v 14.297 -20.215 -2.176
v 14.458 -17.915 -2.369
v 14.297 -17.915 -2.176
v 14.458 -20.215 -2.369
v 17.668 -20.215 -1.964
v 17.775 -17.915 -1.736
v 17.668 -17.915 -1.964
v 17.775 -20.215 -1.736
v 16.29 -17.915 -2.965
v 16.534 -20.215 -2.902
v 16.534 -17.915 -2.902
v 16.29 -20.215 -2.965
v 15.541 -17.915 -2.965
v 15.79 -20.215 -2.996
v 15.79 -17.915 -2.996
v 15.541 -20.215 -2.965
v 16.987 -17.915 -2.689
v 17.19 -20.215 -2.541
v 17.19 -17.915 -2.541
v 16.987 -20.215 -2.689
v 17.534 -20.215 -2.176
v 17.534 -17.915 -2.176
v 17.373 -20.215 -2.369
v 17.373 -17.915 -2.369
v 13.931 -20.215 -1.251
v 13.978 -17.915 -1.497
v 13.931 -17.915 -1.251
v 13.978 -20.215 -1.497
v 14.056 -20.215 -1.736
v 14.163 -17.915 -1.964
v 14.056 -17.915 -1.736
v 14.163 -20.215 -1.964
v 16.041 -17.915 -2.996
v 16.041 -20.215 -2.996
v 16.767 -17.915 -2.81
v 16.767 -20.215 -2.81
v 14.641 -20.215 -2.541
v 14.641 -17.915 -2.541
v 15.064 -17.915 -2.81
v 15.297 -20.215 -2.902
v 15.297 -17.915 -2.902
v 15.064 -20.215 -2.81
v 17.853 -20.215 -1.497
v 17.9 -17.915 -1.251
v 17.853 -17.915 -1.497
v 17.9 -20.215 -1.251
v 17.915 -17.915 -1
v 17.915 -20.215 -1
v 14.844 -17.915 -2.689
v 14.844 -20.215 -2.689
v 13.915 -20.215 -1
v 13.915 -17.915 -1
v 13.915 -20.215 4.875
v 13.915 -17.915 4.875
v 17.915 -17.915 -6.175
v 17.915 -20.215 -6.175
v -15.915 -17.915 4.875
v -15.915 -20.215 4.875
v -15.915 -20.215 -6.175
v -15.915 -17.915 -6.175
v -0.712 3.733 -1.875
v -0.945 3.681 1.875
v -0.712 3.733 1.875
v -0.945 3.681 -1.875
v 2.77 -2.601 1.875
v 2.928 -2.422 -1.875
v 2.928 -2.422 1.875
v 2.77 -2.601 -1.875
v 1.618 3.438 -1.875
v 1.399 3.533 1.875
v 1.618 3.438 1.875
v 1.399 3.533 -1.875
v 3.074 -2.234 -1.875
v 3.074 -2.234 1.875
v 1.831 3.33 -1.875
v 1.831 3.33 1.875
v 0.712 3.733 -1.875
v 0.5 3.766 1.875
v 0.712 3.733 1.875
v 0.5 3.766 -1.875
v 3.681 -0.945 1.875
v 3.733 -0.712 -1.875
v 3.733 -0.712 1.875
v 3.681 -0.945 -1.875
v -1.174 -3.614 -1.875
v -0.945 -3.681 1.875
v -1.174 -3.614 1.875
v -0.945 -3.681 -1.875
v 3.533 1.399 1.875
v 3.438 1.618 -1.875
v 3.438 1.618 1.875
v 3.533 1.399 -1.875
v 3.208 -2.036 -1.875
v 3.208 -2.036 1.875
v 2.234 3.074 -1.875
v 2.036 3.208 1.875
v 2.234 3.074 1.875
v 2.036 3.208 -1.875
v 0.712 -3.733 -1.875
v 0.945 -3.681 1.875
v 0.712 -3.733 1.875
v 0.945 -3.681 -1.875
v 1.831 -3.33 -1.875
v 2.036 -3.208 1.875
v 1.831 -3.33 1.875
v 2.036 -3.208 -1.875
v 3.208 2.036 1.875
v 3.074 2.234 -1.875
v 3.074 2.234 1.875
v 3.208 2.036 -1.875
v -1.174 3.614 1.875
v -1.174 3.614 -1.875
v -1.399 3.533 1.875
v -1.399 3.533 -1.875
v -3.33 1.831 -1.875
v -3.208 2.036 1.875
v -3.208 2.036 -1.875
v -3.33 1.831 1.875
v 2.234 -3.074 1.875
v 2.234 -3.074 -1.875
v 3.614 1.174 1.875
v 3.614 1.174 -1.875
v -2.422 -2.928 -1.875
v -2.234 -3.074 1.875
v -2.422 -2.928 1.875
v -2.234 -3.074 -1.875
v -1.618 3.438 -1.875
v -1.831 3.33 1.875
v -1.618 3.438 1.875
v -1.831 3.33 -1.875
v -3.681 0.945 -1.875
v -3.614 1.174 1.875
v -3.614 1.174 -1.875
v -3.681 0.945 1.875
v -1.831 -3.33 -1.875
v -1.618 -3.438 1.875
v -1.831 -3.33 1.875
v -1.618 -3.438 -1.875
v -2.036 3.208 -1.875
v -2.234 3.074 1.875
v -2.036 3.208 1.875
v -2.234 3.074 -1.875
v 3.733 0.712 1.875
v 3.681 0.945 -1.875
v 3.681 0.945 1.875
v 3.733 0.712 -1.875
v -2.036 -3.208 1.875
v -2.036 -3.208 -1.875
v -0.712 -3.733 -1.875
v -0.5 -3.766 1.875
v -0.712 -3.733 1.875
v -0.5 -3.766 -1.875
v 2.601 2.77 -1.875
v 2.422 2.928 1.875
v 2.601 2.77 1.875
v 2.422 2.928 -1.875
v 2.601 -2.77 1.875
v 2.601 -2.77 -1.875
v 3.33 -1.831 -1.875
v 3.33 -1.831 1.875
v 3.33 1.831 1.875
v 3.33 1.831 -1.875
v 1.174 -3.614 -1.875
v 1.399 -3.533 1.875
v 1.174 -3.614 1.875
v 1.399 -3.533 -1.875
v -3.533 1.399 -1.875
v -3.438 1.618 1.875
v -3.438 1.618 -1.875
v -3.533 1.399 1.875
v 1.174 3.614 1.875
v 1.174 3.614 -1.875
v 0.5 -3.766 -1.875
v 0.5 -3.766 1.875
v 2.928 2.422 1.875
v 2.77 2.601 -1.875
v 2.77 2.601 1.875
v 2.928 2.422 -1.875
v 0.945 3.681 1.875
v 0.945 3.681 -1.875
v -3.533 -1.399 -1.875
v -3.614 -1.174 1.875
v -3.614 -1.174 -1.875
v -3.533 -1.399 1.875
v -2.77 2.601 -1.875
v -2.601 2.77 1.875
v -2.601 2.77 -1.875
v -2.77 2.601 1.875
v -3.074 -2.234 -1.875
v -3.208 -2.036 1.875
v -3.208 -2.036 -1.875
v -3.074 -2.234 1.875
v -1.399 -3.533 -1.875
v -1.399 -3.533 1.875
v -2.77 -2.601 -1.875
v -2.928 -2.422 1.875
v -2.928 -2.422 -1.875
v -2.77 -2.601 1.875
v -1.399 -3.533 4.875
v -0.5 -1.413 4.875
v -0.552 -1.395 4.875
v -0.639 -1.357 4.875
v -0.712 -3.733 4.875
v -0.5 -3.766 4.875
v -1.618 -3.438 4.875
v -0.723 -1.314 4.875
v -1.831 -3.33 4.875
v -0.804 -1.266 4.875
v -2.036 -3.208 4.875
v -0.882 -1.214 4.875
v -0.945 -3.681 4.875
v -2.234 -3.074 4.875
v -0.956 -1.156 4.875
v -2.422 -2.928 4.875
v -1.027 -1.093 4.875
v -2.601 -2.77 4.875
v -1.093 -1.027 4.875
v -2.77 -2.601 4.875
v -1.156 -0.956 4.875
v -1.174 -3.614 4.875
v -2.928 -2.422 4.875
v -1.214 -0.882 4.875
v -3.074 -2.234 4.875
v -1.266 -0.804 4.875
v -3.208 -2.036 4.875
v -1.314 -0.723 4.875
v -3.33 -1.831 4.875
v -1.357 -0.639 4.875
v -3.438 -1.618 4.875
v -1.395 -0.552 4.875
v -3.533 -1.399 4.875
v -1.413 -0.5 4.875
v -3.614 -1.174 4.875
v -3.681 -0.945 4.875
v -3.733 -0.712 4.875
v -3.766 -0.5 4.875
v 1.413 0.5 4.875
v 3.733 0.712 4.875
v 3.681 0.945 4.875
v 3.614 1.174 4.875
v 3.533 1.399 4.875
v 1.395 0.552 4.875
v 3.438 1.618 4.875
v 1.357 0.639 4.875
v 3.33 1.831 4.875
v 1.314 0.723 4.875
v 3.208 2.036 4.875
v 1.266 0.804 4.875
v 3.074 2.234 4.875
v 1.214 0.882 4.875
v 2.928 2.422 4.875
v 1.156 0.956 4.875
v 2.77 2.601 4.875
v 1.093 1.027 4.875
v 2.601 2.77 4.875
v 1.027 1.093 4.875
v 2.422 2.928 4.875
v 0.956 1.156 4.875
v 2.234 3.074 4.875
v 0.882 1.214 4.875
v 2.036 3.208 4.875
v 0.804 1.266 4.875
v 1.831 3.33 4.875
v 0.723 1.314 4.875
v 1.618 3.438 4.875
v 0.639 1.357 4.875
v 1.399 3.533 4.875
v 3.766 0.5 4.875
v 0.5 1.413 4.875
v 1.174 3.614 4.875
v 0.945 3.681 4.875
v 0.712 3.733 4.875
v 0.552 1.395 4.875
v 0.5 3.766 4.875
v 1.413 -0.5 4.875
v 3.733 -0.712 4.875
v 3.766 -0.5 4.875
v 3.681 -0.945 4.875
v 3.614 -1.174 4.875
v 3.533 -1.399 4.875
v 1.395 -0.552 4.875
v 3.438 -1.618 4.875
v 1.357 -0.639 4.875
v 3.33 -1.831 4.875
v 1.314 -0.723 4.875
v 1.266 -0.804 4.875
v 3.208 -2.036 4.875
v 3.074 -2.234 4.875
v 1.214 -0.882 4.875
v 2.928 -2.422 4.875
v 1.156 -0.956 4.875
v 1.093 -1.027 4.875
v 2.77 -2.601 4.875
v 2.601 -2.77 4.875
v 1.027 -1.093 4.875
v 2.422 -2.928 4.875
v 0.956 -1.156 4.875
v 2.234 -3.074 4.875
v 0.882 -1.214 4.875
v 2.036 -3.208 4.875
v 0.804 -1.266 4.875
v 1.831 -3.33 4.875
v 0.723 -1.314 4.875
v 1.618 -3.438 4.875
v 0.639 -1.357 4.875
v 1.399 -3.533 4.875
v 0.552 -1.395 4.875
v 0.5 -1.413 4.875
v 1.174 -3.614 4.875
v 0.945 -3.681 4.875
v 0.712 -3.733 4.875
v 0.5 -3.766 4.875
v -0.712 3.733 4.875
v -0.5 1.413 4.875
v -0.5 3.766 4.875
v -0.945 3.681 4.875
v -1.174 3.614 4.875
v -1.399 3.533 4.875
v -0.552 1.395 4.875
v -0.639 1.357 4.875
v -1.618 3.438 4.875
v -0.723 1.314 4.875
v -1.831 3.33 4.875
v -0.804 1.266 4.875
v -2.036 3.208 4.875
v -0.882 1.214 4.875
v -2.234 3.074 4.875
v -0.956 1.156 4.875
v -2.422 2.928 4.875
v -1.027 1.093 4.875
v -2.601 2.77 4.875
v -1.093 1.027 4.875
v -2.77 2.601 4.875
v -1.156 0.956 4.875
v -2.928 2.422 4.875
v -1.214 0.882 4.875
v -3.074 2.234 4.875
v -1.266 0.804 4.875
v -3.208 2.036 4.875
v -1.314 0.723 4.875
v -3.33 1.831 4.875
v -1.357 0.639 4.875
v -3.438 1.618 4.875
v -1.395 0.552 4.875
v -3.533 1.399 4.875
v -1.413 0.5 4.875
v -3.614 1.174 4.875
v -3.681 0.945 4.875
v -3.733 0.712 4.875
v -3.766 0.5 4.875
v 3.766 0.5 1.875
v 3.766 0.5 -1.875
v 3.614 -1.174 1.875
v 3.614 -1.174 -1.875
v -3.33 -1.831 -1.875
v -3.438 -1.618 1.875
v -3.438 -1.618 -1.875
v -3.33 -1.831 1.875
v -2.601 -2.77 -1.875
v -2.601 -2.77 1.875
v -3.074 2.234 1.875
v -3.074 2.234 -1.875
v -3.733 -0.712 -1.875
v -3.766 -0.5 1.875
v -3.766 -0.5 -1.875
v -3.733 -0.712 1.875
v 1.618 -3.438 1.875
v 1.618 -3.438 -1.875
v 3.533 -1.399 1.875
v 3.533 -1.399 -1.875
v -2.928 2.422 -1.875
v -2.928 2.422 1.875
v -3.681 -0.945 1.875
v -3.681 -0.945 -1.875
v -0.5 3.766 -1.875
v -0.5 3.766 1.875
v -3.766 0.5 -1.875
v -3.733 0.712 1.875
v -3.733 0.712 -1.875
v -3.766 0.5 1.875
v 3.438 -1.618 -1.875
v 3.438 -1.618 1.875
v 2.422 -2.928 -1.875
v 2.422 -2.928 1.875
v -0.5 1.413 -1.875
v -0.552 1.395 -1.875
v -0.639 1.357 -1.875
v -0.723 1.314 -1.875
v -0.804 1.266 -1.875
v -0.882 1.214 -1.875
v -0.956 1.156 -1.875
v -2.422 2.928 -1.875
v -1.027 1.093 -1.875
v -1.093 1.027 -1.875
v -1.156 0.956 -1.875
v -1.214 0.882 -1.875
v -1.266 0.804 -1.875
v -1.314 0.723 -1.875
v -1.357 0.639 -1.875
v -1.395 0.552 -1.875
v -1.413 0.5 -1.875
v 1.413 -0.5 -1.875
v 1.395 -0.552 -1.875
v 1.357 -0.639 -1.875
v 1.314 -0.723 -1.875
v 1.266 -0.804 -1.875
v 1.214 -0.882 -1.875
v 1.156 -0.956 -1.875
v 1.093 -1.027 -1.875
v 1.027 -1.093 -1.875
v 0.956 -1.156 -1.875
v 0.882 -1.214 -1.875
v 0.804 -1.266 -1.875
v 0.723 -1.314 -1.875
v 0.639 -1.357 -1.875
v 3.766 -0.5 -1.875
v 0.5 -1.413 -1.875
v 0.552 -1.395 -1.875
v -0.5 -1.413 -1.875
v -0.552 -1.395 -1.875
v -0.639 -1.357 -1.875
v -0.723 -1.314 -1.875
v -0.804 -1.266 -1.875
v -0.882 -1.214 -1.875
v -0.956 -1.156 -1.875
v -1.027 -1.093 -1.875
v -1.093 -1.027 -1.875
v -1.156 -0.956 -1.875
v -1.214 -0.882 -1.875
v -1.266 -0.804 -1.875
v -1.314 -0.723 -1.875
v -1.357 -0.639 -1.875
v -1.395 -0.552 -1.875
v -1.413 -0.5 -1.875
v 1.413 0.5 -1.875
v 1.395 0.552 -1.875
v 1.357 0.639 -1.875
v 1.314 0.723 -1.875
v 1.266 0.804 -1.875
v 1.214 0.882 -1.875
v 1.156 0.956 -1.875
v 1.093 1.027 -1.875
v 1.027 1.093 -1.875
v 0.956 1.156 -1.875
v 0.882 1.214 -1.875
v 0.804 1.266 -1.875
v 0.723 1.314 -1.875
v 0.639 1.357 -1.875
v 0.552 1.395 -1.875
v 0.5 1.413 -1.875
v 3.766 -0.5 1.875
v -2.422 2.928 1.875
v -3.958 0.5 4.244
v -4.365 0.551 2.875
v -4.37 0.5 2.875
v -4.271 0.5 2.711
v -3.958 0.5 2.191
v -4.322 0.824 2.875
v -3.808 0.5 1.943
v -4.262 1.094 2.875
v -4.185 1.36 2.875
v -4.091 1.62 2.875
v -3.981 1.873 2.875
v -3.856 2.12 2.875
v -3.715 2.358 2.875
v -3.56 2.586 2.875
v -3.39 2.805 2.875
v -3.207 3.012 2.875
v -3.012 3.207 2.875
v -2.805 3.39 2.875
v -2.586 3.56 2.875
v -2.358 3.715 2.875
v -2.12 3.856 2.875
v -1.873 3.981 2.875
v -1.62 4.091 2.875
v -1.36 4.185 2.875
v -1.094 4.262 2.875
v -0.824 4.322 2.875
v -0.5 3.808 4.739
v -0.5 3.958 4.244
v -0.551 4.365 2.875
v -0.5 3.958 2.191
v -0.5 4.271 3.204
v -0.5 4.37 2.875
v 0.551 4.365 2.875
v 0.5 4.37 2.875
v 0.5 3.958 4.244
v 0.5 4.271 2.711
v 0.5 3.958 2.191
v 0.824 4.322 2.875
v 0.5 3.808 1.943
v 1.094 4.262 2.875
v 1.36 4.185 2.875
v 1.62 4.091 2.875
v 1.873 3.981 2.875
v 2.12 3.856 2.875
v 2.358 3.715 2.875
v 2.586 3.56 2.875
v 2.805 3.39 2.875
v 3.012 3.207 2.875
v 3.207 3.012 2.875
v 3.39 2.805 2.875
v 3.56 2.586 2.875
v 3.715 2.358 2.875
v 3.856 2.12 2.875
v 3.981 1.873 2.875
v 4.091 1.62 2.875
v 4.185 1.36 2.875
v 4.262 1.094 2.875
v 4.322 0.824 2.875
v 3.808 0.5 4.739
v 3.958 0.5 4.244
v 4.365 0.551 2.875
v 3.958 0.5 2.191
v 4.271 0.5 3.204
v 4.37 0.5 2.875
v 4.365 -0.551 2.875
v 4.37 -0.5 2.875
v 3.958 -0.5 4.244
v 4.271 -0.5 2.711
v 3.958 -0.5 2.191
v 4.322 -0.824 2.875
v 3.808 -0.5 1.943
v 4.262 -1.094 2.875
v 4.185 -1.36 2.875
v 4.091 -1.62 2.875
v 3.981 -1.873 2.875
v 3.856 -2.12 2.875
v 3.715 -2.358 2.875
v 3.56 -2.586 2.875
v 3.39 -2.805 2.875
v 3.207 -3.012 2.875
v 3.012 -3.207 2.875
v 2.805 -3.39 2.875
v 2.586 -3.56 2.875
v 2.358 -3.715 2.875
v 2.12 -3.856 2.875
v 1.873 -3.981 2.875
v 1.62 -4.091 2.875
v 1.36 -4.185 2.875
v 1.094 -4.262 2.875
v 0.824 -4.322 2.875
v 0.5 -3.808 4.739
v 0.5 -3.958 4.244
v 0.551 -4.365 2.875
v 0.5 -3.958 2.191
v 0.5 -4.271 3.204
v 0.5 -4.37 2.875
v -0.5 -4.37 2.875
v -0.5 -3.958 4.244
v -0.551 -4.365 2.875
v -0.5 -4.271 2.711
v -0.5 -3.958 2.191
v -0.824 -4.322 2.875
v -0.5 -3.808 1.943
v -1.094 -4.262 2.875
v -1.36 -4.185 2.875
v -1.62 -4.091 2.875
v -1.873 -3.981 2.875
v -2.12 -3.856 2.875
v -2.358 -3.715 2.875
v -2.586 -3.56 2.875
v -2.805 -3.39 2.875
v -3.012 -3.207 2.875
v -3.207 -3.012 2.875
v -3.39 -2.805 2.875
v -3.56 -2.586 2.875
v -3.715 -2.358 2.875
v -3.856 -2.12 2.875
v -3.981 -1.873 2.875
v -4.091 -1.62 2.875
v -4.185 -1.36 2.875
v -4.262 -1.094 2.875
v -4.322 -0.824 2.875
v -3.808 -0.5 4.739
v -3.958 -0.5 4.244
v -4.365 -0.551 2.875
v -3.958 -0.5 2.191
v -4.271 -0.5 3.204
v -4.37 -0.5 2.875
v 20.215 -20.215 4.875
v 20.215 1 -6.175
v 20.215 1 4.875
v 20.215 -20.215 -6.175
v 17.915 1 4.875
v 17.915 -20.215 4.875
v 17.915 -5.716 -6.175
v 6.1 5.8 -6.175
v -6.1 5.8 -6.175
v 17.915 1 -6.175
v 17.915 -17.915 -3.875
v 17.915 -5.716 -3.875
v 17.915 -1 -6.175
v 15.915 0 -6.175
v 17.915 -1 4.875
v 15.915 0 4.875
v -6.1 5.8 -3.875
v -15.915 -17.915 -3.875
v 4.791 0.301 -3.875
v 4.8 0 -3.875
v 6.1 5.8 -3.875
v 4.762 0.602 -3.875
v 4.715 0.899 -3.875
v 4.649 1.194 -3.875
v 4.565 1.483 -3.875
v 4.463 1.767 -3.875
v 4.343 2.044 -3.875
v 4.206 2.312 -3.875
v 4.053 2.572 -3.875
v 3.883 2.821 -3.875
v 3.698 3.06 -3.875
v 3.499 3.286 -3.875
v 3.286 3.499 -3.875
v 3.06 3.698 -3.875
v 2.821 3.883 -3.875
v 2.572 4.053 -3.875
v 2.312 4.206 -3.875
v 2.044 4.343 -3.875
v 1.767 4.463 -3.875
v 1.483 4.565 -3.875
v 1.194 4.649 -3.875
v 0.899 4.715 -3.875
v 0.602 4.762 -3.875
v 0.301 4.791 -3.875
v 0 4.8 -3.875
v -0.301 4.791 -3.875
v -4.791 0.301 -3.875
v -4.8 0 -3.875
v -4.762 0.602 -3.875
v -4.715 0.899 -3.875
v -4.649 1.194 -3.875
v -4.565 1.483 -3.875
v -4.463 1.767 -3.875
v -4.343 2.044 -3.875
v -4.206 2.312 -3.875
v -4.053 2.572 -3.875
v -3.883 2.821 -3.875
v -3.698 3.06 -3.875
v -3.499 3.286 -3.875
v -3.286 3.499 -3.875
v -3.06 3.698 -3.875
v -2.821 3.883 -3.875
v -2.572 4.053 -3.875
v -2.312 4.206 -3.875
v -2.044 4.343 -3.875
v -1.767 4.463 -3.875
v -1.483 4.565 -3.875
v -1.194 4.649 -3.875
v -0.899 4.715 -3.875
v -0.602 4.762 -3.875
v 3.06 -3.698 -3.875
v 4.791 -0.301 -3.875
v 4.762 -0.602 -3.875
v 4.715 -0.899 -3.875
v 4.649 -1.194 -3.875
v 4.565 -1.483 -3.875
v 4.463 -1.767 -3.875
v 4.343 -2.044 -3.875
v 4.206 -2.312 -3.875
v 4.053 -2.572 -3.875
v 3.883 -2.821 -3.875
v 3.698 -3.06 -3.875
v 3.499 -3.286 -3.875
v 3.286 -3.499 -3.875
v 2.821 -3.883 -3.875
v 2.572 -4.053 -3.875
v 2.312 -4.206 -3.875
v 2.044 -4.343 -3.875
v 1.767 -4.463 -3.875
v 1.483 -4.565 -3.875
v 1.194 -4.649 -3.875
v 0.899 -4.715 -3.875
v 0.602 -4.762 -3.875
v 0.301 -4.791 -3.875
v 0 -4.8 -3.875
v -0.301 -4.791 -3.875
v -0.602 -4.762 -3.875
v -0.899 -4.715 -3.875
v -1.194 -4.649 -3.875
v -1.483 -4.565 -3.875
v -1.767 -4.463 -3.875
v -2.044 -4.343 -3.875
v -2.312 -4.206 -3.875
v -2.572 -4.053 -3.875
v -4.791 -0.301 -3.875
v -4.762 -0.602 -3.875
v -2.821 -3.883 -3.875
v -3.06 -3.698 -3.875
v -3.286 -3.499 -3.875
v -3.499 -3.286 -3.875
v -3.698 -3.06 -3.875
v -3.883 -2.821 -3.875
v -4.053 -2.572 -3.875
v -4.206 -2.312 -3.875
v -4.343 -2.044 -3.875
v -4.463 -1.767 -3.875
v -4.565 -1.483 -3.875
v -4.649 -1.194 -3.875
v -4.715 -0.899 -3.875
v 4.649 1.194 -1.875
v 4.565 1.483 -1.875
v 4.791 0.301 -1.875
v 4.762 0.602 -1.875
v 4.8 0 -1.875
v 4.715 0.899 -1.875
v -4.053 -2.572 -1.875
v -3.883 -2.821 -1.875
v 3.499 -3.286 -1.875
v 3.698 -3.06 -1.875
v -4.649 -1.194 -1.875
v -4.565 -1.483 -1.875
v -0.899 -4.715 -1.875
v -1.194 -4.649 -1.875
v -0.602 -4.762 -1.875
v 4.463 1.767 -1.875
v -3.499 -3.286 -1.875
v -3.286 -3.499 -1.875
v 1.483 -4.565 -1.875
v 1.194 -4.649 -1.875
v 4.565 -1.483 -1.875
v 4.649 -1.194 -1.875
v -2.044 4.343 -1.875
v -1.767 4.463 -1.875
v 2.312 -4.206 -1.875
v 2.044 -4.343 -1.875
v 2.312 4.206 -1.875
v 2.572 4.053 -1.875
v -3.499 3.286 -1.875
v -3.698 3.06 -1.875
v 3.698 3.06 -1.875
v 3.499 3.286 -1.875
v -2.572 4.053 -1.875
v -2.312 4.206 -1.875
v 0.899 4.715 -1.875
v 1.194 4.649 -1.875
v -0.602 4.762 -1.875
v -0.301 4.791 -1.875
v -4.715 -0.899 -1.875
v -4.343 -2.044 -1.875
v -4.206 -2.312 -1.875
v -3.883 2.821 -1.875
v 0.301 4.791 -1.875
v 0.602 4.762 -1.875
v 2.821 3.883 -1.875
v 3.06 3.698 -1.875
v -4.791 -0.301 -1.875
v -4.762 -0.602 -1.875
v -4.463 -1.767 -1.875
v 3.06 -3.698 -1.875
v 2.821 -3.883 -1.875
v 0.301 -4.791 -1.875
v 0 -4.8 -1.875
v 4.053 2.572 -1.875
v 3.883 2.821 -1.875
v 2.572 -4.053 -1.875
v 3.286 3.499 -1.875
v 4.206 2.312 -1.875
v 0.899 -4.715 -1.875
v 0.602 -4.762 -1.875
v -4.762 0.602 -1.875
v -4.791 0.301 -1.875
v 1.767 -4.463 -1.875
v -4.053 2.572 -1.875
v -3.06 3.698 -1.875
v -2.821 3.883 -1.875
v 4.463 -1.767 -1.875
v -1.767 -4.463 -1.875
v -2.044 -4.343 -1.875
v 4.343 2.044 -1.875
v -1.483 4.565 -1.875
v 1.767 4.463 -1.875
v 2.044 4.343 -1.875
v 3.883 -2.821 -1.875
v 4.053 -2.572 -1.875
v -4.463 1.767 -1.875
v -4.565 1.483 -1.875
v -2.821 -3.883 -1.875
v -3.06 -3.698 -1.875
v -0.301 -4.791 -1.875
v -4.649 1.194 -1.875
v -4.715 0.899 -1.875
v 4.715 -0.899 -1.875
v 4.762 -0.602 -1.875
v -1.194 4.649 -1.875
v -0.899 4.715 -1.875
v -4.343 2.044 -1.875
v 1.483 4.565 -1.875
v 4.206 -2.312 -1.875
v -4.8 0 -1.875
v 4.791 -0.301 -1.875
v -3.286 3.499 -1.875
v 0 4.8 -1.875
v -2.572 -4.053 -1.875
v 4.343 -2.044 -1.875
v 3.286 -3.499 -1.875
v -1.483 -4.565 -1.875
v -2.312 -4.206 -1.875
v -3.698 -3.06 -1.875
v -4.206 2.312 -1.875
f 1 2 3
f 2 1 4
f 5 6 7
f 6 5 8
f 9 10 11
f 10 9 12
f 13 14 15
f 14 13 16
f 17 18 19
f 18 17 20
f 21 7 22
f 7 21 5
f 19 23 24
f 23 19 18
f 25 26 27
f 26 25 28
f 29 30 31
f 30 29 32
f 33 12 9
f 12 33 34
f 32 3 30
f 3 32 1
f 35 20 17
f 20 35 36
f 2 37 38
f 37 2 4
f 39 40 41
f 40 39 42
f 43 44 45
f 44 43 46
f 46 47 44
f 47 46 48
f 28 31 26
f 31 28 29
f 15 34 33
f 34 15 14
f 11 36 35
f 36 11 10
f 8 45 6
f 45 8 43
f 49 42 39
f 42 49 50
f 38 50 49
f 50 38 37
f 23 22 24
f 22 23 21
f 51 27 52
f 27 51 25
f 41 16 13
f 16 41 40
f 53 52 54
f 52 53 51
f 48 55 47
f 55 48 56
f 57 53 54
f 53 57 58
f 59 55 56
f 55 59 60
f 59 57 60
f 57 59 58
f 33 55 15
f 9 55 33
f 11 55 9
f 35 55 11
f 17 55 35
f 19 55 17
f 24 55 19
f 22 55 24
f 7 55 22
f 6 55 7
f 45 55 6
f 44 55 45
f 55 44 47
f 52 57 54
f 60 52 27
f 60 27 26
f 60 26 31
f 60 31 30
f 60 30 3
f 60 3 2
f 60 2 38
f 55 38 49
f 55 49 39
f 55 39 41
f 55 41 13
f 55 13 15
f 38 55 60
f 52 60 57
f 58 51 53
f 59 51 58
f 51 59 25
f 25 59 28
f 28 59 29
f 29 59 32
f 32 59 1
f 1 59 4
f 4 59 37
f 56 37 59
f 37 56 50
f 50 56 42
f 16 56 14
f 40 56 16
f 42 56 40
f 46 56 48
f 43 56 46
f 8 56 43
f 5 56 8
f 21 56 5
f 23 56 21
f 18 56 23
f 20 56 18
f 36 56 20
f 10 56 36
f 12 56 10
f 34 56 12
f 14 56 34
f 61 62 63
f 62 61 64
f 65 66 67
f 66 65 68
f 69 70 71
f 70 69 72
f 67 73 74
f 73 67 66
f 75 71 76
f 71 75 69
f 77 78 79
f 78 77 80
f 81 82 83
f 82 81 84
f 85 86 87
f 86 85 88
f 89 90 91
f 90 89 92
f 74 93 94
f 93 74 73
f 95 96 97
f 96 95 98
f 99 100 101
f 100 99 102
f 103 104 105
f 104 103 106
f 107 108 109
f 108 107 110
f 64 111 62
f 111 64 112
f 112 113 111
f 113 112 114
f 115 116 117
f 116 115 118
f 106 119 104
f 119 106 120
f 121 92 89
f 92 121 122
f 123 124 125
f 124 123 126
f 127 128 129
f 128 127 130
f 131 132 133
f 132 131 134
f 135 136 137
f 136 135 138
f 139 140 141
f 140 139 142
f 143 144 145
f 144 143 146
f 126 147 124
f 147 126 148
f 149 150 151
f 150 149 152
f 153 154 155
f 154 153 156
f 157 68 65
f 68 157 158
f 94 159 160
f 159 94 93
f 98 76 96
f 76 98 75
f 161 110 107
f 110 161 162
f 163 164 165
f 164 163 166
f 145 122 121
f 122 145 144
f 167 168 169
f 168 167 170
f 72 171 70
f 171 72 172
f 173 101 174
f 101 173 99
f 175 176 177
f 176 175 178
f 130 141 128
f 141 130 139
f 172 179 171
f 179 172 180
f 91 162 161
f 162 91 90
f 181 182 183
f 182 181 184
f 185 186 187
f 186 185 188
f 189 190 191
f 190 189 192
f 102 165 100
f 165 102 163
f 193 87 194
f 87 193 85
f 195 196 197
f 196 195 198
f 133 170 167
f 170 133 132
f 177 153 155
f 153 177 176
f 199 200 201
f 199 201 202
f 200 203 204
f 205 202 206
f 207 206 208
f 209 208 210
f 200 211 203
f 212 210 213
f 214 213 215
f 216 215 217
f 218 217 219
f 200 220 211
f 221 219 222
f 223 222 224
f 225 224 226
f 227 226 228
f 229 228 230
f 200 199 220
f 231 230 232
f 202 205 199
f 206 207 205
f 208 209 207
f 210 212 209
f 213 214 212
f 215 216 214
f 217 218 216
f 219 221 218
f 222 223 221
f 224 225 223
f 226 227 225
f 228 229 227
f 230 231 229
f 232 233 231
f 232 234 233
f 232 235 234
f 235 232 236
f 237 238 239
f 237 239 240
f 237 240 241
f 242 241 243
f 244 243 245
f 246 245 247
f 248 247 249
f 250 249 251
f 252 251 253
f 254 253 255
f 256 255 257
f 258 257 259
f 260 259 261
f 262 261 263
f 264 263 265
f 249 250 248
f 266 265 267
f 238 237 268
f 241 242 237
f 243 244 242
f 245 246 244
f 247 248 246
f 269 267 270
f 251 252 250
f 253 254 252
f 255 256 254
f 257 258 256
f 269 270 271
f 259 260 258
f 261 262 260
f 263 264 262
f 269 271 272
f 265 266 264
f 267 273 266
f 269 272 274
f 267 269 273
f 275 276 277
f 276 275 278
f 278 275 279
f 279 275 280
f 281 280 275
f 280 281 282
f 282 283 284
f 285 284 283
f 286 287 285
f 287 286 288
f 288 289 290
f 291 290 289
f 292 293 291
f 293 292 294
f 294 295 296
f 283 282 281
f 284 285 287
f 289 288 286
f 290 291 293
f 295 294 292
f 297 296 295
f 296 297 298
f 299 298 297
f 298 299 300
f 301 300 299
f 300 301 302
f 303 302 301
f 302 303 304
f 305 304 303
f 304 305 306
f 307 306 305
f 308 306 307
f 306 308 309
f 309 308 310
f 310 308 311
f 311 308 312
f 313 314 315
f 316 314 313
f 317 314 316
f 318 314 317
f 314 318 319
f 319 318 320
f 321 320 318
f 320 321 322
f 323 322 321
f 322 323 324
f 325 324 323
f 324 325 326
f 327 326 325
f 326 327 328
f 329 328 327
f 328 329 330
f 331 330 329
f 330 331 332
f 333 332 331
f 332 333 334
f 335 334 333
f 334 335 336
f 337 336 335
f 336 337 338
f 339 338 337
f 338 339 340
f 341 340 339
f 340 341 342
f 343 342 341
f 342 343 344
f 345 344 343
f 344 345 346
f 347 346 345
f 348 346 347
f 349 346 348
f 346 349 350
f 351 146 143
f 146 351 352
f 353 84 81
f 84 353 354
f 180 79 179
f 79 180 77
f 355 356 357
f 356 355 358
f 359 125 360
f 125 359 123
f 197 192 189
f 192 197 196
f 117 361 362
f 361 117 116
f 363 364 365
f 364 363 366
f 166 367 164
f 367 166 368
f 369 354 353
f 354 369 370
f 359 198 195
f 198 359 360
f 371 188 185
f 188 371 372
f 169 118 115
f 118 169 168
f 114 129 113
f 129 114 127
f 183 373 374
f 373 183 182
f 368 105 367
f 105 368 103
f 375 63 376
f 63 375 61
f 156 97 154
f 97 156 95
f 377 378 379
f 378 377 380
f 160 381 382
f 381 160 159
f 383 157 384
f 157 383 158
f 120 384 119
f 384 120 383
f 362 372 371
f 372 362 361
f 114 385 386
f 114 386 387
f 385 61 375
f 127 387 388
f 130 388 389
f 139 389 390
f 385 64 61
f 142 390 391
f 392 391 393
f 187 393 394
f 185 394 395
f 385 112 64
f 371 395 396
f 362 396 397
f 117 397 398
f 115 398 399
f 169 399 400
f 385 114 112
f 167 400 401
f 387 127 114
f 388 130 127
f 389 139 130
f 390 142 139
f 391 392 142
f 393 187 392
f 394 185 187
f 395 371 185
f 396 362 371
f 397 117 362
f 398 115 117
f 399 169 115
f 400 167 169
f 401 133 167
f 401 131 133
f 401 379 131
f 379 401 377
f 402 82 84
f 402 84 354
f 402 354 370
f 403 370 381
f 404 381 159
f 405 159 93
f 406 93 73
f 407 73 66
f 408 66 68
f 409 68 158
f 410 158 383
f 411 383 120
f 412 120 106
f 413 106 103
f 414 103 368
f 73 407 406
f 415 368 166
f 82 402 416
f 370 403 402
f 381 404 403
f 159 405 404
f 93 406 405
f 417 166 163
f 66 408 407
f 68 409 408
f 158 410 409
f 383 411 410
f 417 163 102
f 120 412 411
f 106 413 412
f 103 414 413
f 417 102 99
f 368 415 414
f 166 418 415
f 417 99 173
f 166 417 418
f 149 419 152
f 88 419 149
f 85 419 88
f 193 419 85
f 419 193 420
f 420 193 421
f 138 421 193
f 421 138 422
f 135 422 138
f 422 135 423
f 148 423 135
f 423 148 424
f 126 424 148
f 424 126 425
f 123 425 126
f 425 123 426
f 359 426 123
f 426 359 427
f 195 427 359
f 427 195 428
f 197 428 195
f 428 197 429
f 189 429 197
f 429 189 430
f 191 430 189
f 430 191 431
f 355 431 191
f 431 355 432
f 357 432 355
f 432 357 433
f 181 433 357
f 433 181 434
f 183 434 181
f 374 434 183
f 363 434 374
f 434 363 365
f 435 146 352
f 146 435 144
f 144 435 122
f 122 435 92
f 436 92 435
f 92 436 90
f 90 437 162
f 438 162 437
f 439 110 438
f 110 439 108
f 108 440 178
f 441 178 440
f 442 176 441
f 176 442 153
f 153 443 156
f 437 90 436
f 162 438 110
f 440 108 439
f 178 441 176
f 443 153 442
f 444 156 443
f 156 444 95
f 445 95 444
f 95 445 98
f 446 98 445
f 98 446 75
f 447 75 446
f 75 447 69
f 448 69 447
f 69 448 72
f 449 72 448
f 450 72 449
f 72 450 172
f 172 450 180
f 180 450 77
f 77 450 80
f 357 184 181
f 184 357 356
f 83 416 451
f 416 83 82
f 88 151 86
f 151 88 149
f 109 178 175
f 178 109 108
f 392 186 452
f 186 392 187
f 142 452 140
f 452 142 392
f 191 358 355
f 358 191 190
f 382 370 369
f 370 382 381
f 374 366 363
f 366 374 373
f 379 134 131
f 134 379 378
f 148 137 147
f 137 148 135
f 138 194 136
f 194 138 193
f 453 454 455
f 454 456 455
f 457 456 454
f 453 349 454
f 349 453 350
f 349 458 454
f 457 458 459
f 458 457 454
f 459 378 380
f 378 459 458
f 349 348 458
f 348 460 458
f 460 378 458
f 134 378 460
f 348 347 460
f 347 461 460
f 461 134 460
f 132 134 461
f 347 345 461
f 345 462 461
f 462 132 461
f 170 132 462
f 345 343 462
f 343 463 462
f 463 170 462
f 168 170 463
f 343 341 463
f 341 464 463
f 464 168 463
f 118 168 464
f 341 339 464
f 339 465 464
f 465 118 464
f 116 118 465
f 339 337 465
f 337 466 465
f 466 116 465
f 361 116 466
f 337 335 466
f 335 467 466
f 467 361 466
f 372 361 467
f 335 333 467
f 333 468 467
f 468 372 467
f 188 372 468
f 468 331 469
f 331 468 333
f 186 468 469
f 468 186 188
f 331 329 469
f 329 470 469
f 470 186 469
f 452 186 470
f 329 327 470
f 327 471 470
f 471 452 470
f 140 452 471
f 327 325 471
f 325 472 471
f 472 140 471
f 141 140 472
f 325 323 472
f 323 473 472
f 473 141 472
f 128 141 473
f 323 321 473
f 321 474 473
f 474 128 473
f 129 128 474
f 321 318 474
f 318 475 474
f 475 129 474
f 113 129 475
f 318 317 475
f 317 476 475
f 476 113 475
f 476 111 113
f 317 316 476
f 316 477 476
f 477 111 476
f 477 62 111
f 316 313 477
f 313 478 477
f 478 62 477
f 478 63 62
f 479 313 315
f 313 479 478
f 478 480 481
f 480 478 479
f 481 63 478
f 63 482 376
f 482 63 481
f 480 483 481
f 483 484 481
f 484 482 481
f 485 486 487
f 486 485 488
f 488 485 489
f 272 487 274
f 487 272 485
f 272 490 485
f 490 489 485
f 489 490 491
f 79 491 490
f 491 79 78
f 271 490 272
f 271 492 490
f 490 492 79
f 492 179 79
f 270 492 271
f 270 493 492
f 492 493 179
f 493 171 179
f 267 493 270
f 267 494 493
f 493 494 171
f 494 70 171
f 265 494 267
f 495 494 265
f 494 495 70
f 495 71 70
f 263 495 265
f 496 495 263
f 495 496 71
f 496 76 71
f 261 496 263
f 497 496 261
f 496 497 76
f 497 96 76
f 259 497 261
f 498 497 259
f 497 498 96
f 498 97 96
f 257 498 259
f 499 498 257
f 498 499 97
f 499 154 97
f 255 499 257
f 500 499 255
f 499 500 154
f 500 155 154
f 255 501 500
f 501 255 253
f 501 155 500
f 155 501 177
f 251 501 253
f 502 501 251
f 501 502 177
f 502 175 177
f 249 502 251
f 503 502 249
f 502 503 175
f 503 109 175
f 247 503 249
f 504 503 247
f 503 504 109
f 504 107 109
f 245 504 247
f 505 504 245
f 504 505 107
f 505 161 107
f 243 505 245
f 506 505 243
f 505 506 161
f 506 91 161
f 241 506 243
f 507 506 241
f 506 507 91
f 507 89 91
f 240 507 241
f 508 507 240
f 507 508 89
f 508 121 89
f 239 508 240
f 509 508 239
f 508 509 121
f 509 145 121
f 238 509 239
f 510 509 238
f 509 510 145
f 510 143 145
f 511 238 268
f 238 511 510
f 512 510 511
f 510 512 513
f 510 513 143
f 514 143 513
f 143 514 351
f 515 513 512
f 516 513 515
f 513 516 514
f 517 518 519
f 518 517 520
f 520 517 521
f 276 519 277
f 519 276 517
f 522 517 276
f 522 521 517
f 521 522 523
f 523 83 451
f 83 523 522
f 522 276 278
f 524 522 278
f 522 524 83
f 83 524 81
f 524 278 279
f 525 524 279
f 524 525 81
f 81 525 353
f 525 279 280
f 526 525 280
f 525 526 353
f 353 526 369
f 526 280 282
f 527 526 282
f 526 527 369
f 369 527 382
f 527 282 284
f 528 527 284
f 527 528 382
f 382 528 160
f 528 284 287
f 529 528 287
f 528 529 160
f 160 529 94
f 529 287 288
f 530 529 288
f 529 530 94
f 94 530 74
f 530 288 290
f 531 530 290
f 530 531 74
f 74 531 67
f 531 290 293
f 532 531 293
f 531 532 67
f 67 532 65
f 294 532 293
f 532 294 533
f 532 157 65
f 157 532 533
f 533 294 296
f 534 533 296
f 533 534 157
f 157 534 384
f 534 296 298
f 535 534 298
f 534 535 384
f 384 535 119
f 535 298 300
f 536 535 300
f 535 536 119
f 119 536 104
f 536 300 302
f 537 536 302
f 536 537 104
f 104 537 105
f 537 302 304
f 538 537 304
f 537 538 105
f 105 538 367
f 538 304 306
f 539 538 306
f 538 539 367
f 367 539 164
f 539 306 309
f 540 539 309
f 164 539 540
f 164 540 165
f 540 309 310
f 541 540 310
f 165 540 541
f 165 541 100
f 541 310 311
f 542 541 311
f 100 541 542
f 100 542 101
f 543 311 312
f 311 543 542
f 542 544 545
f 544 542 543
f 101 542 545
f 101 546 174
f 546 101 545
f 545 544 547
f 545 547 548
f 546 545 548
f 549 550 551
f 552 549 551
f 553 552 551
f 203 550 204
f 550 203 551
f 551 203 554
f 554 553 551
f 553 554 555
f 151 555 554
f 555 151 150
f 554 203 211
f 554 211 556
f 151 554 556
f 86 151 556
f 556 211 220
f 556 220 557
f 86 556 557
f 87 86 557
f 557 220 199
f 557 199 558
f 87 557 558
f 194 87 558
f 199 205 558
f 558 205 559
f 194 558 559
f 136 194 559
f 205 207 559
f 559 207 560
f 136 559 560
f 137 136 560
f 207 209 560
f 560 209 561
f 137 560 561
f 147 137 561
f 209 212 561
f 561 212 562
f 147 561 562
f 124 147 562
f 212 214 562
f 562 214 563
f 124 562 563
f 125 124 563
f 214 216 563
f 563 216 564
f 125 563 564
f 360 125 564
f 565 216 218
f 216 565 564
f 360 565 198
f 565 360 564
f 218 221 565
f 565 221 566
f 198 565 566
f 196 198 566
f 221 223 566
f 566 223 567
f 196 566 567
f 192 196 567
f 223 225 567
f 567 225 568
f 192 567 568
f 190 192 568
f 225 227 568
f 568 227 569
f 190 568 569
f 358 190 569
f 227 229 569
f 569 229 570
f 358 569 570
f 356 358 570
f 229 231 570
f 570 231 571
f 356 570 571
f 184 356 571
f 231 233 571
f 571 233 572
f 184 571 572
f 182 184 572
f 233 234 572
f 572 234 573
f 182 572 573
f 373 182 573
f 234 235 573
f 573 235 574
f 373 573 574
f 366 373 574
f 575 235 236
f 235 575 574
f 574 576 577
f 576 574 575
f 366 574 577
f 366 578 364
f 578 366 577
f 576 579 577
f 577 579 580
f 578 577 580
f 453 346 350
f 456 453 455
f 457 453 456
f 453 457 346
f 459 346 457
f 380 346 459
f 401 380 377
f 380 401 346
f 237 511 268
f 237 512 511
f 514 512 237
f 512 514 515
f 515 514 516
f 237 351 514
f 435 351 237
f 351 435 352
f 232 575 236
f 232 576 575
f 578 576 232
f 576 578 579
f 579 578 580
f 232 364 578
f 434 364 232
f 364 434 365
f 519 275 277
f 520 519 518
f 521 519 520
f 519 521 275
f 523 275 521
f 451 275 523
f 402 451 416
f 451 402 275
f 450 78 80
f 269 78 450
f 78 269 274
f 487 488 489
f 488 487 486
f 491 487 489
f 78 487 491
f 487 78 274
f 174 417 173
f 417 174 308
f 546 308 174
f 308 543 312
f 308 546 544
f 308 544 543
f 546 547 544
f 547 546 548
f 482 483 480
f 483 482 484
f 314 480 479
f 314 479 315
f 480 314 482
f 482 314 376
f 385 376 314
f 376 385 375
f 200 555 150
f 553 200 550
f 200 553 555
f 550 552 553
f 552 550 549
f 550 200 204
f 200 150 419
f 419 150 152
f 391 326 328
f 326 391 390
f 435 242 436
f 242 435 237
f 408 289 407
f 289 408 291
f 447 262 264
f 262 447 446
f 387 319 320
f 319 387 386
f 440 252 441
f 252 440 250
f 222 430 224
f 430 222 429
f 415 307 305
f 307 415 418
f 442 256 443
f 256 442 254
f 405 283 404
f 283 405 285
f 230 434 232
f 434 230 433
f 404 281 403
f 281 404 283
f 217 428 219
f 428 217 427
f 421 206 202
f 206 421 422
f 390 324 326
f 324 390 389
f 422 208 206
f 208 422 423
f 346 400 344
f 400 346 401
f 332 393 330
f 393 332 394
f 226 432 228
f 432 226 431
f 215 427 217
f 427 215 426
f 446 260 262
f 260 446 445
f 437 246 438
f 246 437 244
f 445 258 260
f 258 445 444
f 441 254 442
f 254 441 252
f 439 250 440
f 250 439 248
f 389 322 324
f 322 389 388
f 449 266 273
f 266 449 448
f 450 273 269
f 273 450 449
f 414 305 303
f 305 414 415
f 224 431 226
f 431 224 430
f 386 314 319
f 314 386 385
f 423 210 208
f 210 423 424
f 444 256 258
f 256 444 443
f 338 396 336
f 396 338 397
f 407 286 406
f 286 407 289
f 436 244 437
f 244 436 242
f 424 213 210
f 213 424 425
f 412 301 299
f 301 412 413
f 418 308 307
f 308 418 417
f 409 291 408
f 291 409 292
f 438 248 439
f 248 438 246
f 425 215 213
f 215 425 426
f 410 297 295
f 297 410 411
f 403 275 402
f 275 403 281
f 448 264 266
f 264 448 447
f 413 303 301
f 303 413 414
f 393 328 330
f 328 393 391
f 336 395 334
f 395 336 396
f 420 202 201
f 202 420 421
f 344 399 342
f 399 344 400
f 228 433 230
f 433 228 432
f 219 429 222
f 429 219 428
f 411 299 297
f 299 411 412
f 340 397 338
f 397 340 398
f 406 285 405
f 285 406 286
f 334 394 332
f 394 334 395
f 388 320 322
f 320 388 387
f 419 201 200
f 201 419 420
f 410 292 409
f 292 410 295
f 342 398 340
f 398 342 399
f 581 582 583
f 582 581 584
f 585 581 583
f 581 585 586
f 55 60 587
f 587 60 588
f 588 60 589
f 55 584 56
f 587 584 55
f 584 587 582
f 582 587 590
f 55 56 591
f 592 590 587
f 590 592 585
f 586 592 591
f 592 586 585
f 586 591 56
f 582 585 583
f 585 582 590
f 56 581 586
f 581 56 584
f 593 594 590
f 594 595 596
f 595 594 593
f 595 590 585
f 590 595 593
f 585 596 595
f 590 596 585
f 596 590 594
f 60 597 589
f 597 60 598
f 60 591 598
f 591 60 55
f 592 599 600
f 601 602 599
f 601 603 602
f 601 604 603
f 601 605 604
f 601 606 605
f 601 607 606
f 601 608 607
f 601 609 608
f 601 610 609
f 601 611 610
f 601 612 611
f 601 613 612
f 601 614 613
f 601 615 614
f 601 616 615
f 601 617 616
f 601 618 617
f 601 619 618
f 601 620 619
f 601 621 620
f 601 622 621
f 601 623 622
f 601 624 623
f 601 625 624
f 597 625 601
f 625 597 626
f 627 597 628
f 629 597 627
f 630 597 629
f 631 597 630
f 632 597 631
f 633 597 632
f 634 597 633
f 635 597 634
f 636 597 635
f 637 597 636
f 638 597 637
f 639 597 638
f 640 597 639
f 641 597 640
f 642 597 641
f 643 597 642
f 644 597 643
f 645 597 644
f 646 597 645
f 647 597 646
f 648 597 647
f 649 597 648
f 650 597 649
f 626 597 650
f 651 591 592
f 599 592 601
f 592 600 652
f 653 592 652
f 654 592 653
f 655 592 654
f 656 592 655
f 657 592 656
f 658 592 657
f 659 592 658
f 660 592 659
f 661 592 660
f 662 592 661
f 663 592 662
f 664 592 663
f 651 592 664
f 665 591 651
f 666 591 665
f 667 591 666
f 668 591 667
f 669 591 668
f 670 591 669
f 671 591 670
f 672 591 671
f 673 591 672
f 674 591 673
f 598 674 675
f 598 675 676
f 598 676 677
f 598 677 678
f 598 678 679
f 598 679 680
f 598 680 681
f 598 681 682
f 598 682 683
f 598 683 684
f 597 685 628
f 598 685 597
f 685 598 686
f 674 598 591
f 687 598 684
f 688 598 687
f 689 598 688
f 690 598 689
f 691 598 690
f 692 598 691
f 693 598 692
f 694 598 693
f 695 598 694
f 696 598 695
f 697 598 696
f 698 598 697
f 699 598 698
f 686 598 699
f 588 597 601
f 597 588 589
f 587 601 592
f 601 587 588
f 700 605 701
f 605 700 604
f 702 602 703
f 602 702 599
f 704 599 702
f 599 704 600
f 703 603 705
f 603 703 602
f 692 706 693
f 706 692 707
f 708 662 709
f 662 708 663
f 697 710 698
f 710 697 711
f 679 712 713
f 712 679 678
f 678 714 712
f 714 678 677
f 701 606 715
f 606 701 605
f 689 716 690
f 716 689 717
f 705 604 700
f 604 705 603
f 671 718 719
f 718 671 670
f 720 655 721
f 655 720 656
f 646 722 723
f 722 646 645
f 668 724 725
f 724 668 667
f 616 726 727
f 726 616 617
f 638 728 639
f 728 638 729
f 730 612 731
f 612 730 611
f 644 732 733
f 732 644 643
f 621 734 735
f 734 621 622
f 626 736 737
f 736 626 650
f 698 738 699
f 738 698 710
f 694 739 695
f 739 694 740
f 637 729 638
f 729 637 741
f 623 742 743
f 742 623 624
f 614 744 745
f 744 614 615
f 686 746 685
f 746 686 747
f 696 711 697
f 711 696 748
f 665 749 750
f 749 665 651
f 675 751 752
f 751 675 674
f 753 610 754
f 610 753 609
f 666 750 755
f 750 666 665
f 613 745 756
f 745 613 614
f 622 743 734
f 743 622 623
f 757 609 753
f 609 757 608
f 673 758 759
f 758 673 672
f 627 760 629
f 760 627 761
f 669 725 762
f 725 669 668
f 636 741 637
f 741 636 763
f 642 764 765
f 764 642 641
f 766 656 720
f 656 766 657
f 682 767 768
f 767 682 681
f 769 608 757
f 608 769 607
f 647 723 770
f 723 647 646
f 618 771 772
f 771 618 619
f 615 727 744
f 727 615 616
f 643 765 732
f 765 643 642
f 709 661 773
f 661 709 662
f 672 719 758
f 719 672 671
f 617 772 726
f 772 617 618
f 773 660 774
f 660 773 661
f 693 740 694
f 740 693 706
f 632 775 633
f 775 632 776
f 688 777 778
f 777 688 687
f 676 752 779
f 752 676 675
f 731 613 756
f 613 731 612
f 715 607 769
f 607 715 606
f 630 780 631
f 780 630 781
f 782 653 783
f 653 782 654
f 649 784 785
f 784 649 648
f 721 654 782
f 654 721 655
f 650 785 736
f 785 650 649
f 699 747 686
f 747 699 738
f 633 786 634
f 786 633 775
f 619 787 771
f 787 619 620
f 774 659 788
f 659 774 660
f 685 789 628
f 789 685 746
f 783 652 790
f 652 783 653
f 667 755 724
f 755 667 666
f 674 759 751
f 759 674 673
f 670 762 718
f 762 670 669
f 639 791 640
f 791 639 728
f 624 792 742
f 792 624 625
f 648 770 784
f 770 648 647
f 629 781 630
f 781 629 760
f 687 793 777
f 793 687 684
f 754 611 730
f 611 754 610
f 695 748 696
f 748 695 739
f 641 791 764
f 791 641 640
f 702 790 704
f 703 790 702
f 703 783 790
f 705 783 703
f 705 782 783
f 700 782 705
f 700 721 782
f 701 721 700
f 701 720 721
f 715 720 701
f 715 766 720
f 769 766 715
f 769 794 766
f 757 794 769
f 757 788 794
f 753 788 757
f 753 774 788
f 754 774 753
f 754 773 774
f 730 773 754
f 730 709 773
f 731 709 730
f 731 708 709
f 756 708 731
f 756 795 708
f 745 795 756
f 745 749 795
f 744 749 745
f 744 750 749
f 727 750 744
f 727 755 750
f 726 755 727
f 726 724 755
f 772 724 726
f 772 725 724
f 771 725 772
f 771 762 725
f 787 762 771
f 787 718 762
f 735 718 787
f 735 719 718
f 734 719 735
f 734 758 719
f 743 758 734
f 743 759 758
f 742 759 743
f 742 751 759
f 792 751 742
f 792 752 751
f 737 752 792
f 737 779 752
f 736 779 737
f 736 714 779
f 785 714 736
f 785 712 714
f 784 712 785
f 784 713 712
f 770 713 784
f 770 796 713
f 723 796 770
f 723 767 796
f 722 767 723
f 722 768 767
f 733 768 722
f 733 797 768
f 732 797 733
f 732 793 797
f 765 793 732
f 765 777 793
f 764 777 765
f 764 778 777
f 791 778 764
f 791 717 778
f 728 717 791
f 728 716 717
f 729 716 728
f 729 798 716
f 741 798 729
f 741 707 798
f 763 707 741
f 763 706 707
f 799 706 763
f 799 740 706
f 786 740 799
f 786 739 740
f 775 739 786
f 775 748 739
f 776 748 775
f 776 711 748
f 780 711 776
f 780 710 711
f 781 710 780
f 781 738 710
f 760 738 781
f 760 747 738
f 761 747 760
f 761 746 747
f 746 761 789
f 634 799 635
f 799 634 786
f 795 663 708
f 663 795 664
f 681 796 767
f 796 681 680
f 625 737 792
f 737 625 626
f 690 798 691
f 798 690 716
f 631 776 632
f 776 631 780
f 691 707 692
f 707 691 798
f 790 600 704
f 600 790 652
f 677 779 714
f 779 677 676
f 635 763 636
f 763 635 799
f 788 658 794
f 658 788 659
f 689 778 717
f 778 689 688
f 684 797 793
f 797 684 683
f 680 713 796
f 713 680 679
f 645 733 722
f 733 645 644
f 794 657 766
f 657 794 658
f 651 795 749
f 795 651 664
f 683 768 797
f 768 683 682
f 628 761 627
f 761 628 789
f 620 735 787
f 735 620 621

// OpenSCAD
filament_dia = 1.75;
filament_tolerance = 0;
effective_filament_dia = filament_dia + filament_tolerance;
measure_length = 100;
wheel_dia = measure_length / PI;
wheel_r = wheel_dia / 2;

wall_thickness = 1;
axis_dia = 8;

total_height = effective_filament_dia + wall_thickness * 2;


module mark(subdiv, off, zoff = 0) {
    for(m = [0 : measure_length / subdiv : measure_length - measure_length / subdiv]) {
        rotate([0, 0, m * 360 / measure_length]) {
            translate([wheel_r - off, 0, zoff]) {
                $val = m;
                children();
            }
        }
    }
}

//difference() {

*union() {
    mark_height = 0.4;
    
    teeth_size = 2;
    
    //rotate_extrude($fn=128) translate([wheel_r,0,0]) circle(d = filament_dia);
    
    mark(100, 1.1, (total_height + mark_height) / 2)
        cube([2, 0.5, mark_height], center=true);

    mark(10, 2.1, (total_height + mark_height) / 2) {
        cube([4, 0.5, mark_height], center=true);
        translate([-2.5, 0, 0])
            linear_extrude(mark_height, center=true, $fn=30)
                text(str($val), font="OpenSans Extra Bold", size=3.6, halign="right", valign="center");
    }

    /*
    mark(50, 2 + filament_dia/2, 0) 
        linear_extrude(effective_filament_dia, center=true)
            polygon([[0,-effective_filament_dia/2], [2, 0], [0,effective_filament_dia/2]]);
    */
    difference() {
        quality = 100;
        cylinder(d = wheel_dia, h = total_height, center=true, $fn = quality);
        cylinder(d = axis_dia, h = total_height + 1, center = true, $fn = quality);
        rotate_extrude($fn = quality) {
            translate([wheel_r,0,0]) {
                //square([effective_filament_dia + 2, effective_filament_dia], center=true);
                //translate([effective_filament_dia / 2, 0, 0]) square(effective_filament_dia, center=true);
                circle($fn = 100, d = effective_filament_dia);
            }
        }
    }
}
//cube(500);
//}





mount_thickness = 2.3;
mount_offset = 2;
mount_height = total_height + mount_offset + mount_thickness + 3;
axis_r_tolerance = 0.4;
axis_r = (axis_dia - axis_r_tolerance) / 2;
axis_h_tolerance = 1;
axis_h = total_height + mount_offset + axis_h_tolerance;
axis_pad = 2;

filament_pressure = 1;

translate([0,0, -total_height / 2 - mount_thickness - axis_pad]) {
    translate([wheel_r + mount_offset, -wheel_r - mount_offset - mount_thickness, 0]) cube([mount_thickness, wheel_r + mount_thickness + 3, mount_height]);
    translate([-wheel_r, -wheel_r - mount_offset - mount_thickness, 0]) {
        difference() {
            cube([wheel_dia + mount_offset, mount_thickness, mount_height]);
            rotate([90,0,0]) translate([wheel_dia, mount_height - total_height / 2 - 4, -mount_thickness - 1]) {
                cylinder($fn=50, r = mount_offset, h=mount_thickness + 2);
                translate([0, 5, 2]) 
                    cube([mount_offset * 2, 10, mount_thickness + 2], center=true);
            }
        }
    }
    // teeth
    linear_extrude(mount_height) 
        polygon([
            [wheel_r + mount_offset * (1 - filament_pressure), 0], 
            [wheel_r + mount_offset, -1], 
            [wheel_r + mount_offset, +1]]);
        
    linear_extrude(height=mount_thickness)
        polygon([[-axis_r - mount_thickness, axis_r + 2], [axis_r + mount_thickness, axis_r + 2], [wheel_r + mount_offset + mount_thickness, -wheel_r / 2], [wheel_r + mount_offset, -wheel_r - mount_offset], [-wheel_r, -wheel_r - mount_offset]]);
    
    translate([0,0,mount_thickness]) cylinder($fn = 100, r = axis_r + 1, h = mount_offset);
   
    translate([0,0,mount_thickness + mount_offset]) 
    difference() {
        union() {
            cylinder($fn = 100, r = axis_r, h = axis_h);
            translate([0,0,axis_h-2]) 
                rotate_extrude($fn = 100) translate([axis_r,0,0]) polygon([[0,-1],[0.6,0],[0,2]]);
        };
        translate([0,0, -1]) cylinder($fn = 100, r = axis_r - mount_thickness, h = axis_h + axis_pad);
        translate([0,0,axis_h/2 + 1]) {
            cube([axis_r * 2 + 2, 1, axis_h + 3],center=true);  
            cube([1, axis_r * 2 + 2, axis_h + 3], center=true);
        }
    }
};
   


    
